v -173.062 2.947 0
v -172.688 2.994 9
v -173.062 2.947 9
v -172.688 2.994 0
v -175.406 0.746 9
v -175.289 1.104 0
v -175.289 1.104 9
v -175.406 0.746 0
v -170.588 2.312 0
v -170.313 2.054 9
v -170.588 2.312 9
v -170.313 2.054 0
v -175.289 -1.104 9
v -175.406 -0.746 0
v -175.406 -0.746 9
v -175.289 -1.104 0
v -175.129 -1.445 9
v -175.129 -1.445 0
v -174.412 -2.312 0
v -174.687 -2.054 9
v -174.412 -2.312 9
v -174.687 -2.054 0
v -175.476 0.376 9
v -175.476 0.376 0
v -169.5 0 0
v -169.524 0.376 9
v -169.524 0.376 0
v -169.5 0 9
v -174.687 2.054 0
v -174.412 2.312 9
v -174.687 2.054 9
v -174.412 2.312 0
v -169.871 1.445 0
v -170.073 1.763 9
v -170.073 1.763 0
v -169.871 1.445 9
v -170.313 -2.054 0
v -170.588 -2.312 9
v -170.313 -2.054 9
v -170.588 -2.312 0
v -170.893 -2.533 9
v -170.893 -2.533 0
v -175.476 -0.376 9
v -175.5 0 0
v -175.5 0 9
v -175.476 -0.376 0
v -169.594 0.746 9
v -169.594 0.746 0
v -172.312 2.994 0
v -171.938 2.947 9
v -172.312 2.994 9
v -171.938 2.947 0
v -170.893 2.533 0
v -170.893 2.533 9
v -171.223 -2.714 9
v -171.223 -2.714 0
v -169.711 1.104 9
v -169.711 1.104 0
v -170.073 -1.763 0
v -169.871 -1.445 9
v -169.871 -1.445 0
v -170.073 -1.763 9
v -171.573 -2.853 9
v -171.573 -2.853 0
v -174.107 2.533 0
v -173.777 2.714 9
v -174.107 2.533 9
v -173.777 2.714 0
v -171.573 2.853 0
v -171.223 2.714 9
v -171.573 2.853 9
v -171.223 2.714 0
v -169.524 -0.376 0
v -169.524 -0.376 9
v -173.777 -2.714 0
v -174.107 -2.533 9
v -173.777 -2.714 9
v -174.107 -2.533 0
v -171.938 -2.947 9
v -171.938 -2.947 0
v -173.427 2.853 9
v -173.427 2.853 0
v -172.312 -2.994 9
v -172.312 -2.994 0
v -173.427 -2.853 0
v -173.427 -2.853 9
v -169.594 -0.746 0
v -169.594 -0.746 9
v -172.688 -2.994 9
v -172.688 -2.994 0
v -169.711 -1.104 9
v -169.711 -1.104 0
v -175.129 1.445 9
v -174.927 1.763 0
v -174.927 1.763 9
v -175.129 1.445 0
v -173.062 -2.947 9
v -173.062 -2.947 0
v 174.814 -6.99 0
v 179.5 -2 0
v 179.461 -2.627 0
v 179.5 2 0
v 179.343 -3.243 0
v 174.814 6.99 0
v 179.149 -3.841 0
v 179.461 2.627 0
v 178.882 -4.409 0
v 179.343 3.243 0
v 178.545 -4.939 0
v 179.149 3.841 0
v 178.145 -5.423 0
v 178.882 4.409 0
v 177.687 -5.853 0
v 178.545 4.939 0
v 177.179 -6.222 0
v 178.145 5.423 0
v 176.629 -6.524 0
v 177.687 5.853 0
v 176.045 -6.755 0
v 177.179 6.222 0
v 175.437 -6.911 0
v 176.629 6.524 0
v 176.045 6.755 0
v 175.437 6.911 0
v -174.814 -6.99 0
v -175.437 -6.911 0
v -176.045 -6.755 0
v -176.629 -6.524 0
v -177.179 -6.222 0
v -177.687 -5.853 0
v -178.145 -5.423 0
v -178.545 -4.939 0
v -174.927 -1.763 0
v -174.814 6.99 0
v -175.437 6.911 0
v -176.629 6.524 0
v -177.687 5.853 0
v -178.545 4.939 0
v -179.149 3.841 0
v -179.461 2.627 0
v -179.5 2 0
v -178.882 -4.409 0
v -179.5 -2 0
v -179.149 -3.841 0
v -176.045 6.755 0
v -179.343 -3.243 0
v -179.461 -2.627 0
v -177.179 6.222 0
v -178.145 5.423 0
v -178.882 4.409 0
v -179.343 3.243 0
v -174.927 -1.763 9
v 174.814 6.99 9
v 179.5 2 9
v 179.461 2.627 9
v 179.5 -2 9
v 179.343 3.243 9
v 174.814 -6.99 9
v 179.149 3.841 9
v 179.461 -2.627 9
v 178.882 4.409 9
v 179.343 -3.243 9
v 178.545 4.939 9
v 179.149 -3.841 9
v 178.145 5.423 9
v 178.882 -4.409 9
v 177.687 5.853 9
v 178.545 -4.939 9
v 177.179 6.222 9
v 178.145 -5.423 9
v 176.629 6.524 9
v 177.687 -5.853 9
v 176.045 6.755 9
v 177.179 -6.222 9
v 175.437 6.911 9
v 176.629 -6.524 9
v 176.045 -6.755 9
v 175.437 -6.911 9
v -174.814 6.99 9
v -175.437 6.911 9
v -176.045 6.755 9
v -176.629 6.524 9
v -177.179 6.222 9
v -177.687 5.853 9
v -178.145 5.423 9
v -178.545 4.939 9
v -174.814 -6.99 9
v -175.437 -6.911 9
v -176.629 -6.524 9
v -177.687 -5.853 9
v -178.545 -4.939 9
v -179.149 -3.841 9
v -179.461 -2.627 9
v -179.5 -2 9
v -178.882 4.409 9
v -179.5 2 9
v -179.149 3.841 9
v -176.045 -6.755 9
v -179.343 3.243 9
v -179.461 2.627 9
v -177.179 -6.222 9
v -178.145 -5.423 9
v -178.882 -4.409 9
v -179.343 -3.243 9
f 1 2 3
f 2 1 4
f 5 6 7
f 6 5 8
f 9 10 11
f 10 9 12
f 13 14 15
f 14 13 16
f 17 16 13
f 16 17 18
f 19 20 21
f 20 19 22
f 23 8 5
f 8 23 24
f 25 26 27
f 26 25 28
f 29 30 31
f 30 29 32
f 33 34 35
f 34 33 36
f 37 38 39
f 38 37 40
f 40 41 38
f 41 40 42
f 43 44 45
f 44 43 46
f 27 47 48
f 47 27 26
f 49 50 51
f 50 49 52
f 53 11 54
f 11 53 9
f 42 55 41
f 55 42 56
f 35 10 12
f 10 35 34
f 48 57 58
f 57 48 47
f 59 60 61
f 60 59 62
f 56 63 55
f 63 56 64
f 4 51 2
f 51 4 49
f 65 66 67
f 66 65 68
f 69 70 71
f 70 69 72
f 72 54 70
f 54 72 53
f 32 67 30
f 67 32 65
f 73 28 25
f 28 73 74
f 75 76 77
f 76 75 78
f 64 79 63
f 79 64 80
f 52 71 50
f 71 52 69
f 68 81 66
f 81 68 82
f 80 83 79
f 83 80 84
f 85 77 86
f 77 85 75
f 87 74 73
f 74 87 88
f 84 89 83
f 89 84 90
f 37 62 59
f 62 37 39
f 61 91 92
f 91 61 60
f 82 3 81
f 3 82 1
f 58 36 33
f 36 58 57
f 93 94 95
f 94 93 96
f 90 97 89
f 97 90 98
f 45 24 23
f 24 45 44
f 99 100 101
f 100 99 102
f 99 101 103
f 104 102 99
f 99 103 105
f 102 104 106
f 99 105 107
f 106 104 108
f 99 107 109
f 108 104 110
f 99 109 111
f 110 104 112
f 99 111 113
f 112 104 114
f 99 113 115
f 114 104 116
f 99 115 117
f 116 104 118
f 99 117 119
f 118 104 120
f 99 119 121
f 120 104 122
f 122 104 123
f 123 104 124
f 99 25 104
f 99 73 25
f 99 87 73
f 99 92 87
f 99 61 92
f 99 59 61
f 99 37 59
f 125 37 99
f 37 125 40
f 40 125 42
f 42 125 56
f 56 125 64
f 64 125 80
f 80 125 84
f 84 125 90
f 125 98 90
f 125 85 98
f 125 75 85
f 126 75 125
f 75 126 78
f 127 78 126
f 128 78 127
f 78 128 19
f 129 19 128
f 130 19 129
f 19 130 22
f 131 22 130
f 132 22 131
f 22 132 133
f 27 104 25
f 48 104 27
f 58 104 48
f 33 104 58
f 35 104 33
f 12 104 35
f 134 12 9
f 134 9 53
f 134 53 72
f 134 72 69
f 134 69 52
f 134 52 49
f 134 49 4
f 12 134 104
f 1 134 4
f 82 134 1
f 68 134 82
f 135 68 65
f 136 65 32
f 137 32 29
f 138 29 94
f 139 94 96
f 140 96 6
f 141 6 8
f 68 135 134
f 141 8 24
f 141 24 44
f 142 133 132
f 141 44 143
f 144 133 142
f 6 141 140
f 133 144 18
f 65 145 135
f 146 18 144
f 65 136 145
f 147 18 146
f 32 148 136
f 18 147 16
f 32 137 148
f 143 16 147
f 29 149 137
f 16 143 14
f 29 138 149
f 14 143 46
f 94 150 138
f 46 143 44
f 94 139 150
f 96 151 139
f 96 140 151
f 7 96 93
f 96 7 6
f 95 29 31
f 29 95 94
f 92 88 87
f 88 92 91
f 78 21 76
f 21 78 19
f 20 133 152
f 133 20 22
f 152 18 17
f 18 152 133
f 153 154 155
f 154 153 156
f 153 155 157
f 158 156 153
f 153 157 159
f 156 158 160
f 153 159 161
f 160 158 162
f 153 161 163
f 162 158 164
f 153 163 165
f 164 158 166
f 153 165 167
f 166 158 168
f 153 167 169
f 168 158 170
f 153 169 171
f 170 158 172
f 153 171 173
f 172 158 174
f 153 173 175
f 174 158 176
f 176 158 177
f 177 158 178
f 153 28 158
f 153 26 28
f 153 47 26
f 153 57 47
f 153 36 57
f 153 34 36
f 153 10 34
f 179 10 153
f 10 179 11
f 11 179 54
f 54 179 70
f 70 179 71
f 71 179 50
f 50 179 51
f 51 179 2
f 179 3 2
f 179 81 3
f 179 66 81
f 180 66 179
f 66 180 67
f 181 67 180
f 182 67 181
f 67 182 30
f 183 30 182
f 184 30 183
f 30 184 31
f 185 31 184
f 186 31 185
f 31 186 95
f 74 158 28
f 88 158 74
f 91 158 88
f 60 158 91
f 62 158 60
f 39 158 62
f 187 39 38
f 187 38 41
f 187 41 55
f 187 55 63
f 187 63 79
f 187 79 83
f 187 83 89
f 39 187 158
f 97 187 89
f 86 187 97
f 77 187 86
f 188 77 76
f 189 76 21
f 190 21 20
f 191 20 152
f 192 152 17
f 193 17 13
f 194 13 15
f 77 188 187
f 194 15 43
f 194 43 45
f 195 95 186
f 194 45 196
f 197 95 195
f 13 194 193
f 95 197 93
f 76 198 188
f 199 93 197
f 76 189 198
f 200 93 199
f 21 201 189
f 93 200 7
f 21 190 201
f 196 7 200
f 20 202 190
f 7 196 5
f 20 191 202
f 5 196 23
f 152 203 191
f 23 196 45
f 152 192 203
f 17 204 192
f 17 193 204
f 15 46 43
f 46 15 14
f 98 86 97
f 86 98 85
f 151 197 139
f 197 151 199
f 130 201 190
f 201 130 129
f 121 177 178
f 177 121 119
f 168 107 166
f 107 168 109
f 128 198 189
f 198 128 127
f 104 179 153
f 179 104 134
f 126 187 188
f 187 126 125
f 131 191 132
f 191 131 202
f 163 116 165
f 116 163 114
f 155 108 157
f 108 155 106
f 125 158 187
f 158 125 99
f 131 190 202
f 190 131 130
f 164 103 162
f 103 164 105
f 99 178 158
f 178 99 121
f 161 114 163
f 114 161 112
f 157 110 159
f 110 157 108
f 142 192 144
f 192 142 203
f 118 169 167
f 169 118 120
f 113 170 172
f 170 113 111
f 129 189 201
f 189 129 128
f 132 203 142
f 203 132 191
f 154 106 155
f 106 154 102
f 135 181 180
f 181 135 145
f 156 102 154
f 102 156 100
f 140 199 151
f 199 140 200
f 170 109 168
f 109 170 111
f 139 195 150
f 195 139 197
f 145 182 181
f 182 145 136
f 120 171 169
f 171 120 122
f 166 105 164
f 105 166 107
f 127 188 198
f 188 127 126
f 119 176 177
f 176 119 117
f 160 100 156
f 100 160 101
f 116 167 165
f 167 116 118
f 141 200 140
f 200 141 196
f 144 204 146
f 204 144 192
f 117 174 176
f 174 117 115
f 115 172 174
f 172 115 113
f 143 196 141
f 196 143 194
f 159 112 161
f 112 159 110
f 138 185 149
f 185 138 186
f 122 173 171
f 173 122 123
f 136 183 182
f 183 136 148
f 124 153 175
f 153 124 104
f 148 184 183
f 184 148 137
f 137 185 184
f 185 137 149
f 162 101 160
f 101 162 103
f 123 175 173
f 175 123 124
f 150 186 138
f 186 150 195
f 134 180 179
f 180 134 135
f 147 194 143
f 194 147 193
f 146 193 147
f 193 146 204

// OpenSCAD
$fn = 50;


difference() {
	union() {
		hull() {
			translate(v = [-174.5000000000, 2.0000000000, 0]) {
				cylinder(h = 9, r = 5);
			}
			translate(v = [174.5000000000, 2.0000000000, 0]) {
				cylinder(h = 9, r = 5);
			}
			translate(v = [-174.5000000000, -2.0000000000, 0]) {
				cylinder(h = 9, r = 5);
			}
			translate(v = [174.5000000000, -2.0000000000, 0]) {
				cylinder(h = 9, r = 5);
			}
		}
	}
	union() {
		translate(v = [-172.5000000000, 0.0000000000, 0]) {
			cylinder(h = 9, r = 3.0000000000);
		}
		translate(v = [-172.5000000000, 0.0000000000, 0]) {
			cylinder(h = 9, r = 1.5000000000);
		}
		translate(v = [-172.5000000000, 0.0000000000, 0]) {
			cylinder(h = 9, r = 1.5000000000);
		}
		translate(v = [-172.5000000000, 0.0000000000, 0]) {
			cylinder(h = 9, r = 1.5000000000);
		}
	}
}
